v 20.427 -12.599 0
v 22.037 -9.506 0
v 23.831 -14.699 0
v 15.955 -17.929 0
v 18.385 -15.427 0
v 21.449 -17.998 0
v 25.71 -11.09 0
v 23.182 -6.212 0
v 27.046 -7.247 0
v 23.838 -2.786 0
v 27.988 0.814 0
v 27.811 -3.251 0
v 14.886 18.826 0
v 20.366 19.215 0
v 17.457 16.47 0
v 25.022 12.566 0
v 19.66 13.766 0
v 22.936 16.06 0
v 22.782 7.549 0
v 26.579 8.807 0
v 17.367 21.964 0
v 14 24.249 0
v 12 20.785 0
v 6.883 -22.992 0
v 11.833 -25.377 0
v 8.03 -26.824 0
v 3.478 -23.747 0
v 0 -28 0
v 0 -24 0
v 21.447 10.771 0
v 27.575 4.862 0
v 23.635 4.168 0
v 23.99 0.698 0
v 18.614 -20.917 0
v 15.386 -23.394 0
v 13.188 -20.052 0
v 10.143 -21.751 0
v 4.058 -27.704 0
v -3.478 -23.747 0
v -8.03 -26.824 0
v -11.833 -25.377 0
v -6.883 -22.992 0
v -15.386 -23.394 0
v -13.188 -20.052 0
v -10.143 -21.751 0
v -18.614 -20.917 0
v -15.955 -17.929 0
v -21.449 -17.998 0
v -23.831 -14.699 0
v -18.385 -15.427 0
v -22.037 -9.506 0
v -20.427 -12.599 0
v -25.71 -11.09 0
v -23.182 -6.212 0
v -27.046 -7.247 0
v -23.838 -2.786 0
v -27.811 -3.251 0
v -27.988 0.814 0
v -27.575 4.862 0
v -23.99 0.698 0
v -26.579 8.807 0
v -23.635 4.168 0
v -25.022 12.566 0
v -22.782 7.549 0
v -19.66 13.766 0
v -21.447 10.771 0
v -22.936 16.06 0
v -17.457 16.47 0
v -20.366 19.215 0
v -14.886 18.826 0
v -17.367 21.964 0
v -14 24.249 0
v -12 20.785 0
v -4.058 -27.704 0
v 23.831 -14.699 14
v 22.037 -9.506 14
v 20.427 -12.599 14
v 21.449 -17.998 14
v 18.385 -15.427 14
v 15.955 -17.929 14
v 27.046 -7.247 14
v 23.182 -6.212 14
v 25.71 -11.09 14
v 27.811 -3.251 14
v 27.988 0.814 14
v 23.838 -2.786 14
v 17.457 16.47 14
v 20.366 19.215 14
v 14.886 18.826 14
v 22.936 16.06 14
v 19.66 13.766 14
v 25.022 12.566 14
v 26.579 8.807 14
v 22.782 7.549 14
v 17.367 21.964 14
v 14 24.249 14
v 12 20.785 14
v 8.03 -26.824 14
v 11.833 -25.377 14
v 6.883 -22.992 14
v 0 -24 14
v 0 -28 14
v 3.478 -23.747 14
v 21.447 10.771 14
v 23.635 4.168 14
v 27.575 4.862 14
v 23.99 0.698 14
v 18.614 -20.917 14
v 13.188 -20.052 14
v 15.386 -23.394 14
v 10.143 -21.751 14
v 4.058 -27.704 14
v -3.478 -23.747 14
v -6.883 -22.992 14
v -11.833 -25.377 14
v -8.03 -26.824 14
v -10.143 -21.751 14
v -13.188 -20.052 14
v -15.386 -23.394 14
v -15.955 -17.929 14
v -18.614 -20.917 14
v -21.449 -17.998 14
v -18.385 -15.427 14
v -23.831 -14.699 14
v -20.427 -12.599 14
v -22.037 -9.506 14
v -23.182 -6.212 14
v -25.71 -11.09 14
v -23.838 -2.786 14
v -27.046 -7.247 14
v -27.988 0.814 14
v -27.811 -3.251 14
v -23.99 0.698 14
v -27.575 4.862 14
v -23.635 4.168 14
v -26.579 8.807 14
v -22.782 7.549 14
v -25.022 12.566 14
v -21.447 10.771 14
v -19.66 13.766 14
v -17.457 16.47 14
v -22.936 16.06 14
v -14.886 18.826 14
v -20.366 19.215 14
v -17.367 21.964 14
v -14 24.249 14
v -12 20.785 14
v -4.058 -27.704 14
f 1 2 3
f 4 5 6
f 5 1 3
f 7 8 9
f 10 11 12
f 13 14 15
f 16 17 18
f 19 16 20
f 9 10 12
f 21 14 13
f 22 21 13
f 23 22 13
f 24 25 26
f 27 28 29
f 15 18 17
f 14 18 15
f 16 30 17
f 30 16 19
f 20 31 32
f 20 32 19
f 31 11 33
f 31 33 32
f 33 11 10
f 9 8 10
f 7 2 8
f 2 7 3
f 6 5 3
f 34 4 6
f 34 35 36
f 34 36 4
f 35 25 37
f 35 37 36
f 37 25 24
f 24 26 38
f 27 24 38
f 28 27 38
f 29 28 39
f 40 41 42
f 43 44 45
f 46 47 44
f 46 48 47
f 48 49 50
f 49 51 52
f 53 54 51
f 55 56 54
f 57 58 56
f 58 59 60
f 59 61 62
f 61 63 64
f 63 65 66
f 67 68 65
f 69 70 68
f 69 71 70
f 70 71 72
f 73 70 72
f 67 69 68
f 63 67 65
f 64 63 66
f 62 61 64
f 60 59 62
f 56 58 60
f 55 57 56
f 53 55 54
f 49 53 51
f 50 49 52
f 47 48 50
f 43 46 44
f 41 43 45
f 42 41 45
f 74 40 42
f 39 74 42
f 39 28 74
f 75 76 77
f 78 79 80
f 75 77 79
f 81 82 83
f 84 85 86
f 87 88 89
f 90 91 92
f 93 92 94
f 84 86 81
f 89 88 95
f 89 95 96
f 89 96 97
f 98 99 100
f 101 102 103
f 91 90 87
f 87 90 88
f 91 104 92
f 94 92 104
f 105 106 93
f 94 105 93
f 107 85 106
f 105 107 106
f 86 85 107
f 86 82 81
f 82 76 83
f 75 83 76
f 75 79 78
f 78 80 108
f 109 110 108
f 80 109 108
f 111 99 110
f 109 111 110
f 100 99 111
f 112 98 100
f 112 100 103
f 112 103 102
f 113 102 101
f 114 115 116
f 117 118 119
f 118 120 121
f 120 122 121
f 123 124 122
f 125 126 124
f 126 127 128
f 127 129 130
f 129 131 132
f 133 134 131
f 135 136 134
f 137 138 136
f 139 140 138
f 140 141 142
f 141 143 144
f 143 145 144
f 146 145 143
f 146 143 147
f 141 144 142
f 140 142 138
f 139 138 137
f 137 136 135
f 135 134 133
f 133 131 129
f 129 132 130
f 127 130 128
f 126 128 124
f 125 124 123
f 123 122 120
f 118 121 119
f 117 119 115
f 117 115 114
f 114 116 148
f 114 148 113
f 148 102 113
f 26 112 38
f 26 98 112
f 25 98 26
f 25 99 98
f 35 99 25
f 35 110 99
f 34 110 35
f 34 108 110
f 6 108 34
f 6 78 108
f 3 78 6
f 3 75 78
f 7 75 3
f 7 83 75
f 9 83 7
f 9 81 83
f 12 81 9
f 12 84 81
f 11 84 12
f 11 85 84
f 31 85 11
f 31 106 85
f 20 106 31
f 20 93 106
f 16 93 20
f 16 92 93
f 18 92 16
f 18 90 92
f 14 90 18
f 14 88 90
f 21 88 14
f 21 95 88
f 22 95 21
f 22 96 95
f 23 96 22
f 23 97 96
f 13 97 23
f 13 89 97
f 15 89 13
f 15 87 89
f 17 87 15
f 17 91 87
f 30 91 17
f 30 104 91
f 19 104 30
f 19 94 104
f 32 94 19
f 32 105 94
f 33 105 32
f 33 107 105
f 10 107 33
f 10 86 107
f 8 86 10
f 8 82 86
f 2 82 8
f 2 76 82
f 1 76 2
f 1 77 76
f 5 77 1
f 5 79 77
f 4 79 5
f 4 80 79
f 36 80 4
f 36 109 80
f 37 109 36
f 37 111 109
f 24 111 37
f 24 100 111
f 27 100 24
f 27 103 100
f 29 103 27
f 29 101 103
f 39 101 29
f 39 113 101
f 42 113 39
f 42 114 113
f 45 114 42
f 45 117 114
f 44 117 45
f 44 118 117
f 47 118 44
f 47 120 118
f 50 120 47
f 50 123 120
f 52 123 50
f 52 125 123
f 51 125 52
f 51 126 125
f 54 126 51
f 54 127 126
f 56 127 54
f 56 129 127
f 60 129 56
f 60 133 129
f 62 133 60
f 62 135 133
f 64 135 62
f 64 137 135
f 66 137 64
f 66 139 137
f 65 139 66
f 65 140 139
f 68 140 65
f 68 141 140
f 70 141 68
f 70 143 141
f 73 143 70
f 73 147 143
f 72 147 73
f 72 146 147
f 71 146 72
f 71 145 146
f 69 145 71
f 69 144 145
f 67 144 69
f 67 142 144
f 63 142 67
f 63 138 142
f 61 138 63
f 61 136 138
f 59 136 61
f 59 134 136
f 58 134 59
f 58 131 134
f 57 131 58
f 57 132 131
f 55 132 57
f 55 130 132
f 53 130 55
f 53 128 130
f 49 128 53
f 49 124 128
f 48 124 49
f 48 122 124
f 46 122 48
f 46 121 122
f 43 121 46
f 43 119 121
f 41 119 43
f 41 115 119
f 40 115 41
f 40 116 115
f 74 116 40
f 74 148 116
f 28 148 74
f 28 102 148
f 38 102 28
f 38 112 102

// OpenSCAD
$fn = 32;

// ----------------------------------------------------------------------
// Spring clip: 56 mm outside, 4 mm band, 60 degree opening
// ----------------------------------------------------------------------

// --- parameters (mm) ---
outer_r = 28;             // clip outside radius
inner_r = 24;             // clip bore radius
band = 4;                 // band thickness
clip_w = 14;              // clip width
opening = 60;             // opening angle

clip_profile = [[-14, 24.249], [-17.367, 21.964], [-20.366, 19.215], [-22.936, 16.06], [-25.022, 12.566], [-26.579, 8.807], [-27.575, 4.862], [-27.988, 0.814], [-27.811, -3.251], [-27.046, -7.247], [-25.71, -11.09], [-23.831, -14.699], [-21.449, -17.998], [-18.614, -20.917], [-15.386, -23.394], [-11.833, -25.377], [-8.03, -26.824], [-4.058, -27.704], [0, -28], [4.058, -27.704], [8.03, -26.824], [11.833, -25.377], [15.386, -23.394], [18.614, -20.917], [21.449, -17.998], [23.831, -14.699], [25.71, -11.09], [27.046, -7.247], [27.811, -3.251], [27.988, 0.814], [27.575, 4.862], [26.579, 8.807], [25.022, 12.566], [22.936, 16.06], [20.366, 19.215], [17.367, 21.964], [14, 24.249], [12, 20.785], [14.886, 18.826], [17.457, 16.47], [19.66, 13.766], [21.447, 10.771], [22.782, 7.549], [23.635, 4.168], [23.99, 0.698], [23.838, -2.786], [23.182, -6.212], [22.037, -9.506], [20.427, -12.599], [18.385, -15.427], [15.955, -17.929], [13.188, -20.052], [10.143, -21.751], [6.883, -22.992], [3.478, -23.747], [0, -24], [-3.478, -23.747], [-6.883, -22.992], [-10.143, -21.751], [-13.188, -20.052], [-15.955, -17.929], [-18.385, -15.427], [-20.427, -12.599], [-22.037, -9.506], [-23.182, -6.212], [-23.838, -2.786], [-23.99, 0.698], [-23.635, 4.168], [-22.782, 7.549], [-21.447, 10.771], [-19.66, 13.766], [-17.457, 16.47], [-14.886, 18.826], [-12, 20.785]];

difference() {
  union() {
    linear_extrude(height = clip_w) polygon(clip_profile);
  }
}
